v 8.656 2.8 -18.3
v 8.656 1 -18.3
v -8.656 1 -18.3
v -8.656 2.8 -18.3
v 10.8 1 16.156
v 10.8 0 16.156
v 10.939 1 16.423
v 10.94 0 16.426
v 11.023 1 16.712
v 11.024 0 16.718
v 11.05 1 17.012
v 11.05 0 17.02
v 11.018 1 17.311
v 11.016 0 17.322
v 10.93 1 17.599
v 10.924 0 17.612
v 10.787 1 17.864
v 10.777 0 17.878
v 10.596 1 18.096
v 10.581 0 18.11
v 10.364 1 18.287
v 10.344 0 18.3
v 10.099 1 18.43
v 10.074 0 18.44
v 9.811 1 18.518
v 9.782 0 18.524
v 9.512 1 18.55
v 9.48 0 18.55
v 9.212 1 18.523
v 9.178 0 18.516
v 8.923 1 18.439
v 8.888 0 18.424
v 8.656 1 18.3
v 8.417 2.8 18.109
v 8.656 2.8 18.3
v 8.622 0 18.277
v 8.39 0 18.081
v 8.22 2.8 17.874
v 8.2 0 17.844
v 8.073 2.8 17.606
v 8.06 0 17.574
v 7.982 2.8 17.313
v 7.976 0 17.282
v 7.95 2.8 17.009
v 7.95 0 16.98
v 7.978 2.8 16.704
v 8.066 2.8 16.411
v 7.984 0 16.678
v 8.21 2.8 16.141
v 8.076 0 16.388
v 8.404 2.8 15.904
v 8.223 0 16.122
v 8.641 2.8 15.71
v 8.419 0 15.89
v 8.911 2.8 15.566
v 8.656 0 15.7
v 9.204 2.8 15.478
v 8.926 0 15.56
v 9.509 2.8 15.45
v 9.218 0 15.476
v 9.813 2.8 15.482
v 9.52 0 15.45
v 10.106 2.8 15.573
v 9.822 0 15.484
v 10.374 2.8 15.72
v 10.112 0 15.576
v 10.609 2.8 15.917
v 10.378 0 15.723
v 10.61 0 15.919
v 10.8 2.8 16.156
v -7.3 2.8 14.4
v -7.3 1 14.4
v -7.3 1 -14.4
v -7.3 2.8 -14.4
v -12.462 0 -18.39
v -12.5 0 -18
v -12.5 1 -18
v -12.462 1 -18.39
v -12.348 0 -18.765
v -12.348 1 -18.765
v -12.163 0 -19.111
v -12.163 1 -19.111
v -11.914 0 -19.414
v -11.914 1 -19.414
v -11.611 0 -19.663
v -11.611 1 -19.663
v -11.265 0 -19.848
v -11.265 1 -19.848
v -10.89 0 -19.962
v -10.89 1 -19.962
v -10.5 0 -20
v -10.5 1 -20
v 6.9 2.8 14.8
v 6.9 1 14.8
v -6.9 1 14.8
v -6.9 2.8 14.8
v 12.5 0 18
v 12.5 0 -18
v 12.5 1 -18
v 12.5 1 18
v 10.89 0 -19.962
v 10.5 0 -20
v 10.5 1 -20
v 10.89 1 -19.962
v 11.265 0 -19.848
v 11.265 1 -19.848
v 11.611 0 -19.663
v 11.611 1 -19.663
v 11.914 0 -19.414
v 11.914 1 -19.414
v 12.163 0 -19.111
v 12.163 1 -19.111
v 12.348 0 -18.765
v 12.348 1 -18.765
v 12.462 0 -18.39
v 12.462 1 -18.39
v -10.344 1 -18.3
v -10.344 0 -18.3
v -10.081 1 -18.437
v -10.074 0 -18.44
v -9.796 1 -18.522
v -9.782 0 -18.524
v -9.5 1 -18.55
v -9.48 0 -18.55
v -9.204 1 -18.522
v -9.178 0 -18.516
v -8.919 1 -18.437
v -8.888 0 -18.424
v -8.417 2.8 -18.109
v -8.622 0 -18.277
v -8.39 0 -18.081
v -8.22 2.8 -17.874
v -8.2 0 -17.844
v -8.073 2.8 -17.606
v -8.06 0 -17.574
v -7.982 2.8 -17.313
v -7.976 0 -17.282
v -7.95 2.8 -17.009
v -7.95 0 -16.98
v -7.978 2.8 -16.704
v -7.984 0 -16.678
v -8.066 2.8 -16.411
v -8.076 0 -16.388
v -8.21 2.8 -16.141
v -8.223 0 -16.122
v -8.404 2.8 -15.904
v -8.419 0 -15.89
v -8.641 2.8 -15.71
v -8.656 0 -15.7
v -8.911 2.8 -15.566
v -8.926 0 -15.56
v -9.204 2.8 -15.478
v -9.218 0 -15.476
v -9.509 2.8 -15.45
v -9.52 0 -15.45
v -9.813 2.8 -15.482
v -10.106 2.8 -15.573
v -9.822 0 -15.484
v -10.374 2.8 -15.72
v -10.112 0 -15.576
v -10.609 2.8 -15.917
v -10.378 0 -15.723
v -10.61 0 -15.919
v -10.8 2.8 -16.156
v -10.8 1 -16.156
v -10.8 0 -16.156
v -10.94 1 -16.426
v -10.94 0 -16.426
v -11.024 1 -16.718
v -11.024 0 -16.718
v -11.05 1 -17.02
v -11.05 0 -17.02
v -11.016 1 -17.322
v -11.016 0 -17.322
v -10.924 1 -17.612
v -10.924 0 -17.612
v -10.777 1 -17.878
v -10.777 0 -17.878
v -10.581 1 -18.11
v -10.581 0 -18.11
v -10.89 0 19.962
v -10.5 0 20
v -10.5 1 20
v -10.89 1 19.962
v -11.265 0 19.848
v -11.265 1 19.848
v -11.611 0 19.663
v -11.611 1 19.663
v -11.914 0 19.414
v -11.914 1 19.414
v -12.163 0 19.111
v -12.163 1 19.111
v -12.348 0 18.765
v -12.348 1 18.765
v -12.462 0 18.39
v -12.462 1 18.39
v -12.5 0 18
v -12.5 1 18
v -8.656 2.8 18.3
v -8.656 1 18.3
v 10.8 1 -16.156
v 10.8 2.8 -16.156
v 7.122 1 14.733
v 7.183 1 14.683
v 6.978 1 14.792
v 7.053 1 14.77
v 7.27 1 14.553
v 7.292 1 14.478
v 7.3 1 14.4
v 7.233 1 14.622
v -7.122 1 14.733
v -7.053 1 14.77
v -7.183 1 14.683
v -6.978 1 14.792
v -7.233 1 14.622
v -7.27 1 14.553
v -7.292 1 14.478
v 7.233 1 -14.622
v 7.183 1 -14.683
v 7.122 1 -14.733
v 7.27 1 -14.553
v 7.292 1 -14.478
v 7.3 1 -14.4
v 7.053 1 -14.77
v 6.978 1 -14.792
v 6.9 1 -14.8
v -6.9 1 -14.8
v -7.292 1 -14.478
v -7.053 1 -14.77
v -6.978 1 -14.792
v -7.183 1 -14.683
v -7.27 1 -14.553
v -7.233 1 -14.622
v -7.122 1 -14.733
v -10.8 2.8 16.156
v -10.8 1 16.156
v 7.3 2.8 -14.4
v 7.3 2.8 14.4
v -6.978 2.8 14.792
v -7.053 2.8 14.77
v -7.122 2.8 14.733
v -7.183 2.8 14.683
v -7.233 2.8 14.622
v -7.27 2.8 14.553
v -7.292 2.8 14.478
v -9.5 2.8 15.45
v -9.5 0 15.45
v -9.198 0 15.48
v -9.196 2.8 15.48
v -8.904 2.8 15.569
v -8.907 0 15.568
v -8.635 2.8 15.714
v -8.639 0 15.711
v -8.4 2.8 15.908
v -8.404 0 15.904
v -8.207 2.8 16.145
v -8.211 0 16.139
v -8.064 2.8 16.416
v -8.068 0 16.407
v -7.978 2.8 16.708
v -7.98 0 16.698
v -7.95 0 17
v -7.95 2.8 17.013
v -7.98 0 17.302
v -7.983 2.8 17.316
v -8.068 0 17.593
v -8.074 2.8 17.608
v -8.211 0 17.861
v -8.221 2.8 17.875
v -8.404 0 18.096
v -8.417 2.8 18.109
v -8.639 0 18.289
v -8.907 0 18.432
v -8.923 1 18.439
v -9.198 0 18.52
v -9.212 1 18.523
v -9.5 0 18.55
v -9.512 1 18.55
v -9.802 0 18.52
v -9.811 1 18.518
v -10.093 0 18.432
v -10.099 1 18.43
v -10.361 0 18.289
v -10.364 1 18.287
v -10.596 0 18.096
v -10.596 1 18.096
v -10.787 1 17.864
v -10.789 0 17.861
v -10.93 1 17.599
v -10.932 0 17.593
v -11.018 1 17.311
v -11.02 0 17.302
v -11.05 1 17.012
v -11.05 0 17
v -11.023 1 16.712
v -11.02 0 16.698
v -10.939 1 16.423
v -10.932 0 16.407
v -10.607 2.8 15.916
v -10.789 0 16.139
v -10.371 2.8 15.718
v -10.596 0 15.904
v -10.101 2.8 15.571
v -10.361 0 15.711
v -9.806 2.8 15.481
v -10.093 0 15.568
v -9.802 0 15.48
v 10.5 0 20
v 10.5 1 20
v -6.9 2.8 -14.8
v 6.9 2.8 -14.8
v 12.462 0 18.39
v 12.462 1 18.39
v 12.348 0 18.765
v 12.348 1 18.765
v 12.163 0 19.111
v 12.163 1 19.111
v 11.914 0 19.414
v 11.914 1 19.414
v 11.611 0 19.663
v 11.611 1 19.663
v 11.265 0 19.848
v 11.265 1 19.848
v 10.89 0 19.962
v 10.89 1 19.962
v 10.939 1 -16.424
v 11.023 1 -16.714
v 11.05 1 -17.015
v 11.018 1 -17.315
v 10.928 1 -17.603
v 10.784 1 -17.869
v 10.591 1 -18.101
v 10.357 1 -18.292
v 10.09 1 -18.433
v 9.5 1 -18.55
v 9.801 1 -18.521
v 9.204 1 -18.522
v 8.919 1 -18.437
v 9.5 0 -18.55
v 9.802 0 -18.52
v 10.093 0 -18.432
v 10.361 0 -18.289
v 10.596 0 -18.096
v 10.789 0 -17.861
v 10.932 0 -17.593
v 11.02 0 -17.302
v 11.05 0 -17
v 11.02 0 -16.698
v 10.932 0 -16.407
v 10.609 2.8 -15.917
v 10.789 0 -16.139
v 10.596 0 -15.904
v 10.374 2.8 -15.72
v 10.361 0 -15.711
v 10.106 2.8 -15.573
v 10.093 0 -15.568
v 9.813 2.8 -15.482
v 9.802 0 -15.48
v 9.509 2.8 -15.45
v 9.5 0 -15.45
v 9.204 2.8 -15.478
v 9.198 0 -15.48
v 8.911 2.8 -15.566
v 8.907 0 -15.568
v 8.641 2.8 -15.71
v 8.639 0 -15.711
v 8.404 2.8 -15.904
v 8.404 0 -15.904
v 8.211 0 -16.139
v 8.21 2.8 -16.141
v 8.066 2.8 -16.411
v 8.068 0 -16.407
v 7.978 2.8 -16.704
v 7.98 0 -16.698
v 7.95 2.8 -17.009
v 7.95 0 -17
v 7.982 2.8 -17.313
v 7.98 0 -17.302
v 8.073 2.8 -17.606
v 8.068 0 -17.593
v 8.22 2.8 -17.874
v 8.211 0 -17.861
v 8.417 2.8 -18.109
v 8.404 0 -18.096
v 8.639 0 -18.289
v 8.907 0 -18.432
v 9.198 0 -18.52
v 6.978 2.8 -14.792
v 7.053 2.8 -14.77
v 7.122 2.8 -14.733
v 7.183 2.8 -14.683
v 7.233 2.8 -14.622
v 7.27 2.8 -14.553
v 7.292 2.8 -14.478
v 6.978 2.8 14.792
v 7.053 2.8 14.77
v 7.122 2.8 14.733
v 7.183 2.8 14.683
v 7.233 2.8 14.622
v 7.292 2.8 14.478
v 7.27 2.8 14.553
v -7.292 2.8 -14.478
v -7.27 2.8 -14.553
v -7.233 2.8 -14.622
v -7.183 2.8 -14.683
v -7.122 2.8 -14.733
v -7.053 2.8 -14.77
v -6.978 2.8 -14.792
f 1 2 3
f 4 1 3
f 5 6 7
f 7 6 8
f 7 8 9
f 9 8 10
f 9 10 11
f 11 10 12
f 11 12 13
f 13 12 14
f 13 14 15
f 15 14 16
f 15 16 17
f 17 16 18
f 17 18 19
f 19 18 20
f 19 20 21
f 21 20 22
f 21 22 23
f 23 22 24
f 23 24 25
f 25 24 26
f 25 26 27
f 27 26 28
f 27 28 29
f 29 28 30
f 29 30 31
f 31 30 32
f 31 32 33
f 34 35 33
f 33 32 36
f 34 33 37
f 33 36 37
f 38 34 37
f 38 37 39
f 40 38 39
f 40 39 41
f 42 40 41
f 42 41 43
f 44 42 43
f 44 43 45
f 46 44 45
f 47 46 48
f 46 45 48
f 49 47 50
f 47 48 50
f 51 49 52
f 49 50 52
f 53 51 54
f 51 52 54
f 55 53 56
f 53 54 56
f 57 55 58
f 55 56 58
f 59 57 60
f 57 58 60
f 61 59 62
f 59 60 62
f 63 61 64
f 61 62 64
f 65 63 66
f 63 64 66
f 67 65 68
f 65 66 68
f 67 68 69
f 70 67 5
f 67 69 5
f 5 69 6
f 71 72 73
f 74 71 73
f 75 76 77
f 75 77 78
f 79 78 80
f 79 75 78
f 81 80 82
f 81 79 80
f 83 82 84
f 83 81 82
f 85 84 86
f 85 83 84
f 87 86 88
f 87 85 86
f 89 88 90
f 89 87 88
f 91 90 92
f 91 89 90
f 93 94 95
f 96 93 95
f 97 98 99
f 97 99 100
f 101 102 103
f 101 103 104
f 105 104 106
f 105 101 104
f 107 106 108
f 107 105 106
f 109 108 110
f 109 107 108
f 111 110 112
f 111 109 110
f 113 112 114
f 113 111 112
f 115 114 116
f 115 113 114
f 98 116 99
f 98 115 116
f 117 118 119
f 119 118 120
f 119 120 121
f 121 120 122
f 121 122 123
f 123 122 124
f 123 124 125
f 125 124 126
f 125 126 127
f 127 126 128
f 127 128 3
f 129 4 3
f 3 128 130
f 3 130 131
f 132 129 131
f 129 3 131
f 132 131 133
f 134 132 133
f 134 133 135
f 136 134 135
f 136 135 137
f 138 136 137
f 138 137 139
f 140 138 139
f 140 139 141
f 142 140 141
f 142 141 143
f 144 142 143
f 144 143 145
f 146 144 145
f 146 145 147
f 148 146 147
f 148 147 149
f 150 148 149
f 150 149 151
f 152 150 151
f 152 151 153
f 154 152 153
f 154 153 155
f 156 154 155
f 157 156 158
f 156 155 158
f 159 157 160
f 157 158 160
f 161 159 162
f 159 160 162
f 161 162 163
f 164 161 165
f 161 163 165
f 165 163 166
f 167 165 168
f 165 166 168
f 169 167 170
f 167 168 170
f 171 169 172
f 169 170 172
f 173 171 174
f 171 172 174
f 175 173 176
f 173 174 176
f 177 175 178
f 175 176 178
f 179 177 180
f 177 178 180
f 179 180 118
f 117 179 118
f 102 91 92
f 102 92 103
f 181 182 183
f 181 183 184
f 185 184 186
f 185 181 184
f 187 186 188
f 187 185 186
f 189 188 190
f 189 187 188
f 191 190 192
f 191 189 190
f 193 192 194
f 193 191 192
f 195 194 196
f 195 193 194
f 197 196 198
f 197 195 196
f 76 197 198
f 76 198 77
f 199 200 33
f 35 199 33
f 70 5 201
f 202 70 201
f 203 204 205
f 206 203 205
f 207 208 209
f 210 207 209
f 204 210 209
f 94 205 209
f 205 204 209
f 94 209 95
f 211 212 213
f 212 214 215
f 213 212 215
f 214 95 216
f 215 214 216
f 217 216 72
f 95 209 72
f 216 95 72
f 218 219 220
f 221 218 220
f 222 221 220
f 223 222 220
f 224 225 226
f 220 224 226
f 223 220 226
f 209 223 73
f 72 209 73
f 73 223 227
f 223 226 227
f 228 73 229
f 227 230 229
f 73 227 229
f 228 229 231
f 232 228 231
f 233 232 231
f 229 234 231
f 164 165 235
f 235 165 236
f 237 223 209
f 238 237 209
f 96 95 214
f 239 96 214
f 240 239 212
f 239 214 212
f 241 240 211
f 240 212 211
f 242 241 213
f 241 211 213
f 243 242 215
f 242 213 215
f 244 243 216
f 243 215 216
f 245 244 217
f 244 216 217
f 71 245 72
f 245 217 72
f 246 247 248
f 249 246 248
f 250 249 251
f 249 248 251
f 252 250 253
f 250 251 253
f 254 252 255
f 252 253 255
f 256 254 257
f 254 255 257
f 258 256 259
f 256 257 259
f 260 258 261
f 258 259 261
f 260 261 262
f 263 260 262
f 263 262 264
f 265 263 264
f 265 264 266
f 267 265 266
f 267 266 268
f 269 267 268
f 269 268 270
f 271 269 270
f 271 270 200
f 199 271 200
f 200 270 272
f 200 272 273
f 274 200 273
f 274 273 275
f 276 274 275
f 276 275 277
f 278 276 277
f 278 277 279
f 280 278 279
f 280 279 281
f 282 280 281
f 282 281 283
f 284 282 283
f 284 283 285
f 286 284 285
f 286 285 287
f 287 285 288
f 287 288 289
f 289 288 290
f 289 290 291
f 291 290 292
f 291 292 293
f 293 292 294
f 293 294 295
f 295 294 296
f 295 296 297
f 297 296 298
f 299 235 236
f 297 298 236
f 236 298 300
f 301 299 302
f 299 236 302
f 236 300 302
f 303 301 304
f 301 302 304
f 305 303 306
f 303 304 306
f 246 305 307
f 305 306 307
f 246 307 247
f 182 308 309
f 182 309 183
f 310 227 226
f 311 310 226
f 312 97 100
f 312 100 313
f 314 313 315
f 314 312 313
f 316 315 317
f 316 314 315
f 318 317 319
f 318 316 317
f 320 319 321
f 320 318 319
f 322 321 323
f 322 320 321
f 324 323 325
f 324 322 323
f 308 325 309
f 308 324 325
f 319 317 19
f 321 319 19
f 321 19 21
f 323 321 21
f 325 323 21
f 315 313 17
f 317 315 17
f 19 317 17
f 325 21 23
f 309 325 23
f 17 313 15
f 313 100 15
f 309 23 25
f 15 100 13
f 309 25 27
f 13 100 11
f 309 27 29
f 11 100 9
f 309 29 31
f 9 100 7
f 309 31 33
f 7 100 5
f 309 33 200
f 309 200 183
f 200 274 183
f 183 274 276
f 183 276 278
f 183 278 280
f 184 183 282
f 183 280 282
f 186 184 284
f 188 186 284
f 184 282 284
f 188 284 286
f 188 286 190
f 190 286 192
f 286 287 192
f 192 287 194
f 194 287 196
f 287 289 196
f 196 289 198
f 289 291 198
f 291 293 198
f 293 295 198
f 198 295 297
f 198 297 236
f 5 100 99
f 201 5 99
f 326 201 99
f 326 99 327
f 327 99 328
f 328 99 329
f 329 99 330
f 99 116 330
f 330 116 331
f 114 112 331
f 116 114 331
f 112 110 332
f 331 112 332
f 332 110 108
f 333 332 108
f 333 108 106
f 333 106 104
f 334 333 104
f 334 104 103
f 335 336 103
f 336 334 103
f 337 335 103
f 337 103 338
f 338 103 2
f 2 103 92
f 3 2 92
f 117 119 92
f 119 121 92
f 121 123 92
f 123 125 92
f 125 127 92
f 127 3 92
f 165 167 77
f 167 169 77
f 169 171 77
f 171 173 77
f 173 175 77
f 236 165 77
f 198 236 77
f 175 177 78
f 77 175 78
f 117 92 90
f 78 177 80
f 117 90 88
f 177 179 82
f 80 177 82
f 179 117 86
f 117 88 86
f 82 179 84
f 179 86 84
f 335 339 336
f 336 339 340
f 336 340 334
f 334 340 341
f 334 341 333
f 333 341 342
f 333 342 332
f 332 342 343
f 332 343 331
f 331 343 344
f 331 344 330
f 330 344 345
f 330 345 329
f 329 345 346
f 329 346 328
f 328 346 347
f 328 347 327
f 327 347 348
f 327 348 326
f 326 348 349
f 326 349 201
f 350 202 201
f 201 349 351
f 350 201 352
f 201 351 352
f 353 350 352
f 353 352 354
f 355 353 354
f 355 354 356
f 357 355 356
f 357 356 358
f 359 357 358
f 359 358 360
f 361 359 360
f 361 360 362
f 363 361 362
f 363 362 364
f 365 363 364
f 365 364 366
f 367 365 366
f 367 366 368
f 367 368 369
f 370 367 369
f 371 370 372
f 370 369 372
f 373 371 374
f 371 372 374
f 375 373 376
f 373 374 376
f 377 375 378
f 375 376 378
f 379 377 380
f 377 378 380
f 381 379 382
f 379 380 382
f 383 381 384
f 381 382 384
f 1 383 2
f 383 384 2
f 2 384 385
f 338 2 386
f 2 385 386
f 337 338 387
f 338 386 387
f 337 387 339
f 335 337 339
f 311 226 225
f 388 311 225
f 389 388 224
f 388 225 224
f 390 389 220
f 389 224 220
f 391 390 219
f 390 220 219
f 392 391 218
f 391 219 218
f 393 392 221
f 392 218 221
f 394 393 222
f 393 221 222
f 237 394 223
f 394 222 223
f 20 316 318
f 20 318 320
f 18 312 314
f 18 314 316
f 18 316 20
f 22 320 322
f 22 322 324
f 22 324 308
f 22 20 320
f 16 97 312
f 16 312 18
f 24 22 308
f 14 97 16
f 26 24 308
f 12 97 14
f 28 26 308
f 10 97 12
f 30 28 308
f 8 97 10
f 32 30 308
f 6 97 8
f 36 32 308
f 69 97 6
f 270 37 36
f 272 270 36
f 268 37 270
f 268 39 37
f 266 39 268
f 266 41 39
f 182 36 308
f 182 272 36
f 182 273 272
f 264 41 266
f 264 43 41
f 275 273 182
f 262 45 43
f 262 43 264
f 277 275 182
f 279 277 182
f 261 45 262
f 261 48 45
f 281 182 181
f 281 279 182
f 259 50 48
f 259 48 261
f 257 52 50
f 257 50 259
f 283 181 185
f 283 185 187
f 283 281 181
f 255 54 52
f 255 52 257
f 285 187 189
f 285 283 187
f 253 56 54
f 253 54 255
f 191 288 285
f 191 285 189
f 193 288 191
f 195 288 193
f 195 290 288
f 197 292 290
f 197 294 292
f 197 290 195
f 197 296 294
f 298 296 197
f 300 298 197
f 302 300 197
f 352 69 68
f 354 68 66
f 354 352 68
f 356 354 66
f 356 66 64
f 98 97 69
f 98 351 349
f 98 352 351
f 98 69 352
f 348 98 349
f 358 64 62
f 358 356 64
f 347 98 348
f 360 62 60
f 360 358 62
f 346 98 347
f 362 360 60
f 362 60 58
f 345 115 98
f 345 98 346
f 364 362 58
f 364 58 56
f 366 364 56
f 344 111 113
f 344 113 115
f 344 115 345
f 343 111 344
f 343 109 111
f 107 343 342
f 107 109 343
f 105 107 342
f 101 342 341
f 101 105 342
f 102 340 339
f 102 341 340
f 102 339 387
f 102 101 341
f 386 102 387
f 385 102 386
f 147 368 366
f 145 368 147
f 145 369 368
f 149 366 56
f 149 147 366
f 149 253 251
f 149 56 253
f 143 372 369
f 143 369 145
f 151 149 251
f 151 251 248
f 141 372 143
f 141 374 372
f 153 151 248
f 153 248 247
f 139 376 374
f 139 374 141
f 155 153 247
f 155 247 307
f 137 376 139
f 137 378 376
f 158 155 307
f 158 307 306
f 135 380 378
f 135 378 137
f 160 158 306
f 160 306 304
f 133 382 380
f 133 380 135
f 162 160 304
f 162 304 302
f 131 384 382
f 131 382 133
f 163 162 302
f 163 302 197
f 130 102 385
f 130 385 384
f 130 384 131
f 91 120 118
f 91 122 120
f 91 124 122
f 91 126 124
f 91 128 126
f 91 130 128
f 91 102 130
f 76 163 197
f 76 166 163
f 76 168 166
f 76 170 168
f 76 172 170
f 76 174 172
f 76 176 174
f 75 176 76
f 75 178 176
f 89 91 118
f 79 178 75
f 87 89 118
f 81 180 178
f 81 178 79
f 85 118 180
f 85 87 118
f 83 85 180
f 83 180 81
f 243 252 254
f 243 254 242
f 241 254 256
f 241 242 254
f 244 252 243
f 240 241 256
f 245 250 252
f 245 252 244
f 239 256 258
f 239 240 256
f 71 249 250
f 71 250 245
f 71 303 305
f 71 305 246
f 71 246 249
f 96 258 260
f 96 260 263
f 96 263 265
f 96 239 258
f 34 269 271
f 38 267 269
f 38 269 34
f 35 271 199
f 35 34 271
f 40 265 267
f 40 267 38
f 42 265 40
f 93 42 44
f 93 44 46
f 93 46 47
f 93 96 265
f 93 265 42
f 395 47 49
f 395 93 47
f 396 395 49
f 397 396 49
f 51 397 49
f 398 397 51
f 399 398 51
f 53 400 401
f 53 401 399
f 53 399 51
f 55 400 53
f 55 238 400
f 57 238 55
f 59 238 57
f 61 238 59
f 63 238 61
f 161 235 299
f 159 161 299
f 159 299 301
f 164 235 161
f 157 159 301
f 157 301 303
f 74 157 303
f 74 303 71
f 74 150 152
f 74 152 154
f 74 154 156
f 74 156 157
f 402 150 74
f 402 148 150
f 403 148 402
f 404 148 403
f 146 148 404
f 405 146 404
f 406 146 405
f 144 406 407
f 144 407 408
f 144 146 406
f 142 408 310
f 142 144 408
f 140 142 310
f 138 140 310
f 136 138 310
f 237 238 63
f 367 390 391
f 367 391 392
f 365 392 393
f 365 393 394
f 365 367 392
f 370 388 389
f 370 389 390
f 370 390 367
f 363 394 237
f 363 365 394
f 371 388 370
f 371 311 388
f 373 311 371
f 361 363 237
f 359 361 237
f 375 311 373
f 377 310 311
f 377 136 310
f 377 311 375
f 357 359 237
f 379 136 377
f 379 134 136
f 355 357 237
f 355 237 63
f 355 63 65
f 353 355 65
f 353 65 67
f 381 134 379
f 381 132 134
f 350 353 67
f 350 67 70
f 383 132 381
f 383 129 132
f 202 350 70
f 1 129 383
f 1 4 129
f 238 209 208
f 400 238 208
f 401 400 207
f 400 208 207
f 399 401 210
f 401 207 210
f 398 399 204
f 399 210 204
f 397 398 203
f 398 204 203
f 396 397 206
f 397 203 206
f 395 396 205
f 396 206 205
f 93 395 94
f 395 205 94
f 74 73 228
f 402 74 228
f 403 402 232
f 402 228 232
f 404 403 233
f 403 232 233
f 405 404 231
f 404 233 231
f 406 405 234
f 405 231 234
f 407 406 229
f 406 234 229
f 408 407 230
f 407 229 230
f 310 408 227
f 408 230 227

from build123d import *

# Parameters (mm, degrees)
BASE_DEPTH        = 1
INT_RIEUR_DEPTH   = 1.8
PASSAGE_VIS_REACH = 25.751
ESQUISSE4_R       = 1.55
ESQUISSE5_W       = 27.6
ESQUISSE5_H       = 42.6
CLEANING_DEPTH    = 1.8


with BuildPart() as part:
    # Esquisse1 → Base (new body)
    with BuildSketch(Plane(origin=(0, 0, 0), x_dir=(1, 0, 0), z_dir=(0, 1, 0))):
        with BuildLine():
            Line((-10.5, 20), (10.5, 20))
            ThreePointArc((10.5, 20), (11.914213562, 19.414213562), (12.5, 18))
            Line((12.5, 18), (12.5, -18))
            ThreePointArc((12.5, -18), (11.914213562, -19.414213562), (10.5, -20))
            Line((10.5, -20), (-10.5, -20))
            ThreePointArc((-10.5, -20), (-11.914213562, -19.414213562), (-12.5, -18))
            Line((-12.5, -18), (-12.5, 18))
            ThreePointArc((-12.5, 18), (-11.914213562, 19.414213562), (-10.5, 20))
        make_face()
    extrude(amount=BASE_DEPTH)

    # Esquisse2 → Intérieur (add)
    with BuildSketch(Plane(origin=(0, 1, 0), x_dir=(1, 0, 0), z_dir=(0, 1, 0))):
        with BuildLine():
            Line((10.5, 18.3), (-10.5, 18.3))
            ThreePointArc((-10.5, 18.3), (-10.712132034, 18.212132034), (-10.8, 18))
            Line((-10.8, 18), (-10.8, -18))
            ThreePointArc((-10.8, -18), (-10.712132034, -18.212132034), (-10.5, -18.3))
            Line((-10.5, -18.3), (10.5, -18.3))
            ThreePointArc((10.5, -18.3), (10.712132034, -18.212132034), (10.8, -18))
            Line((10.8, -18), (10.8, 18))
            ThreePointArc((10.8, 18), (10.712132034, 18.212132034), (10.5, 18.3))
        make_face()
        with BuildLine():
            Line((-6.9, 14.8), (6.9, 14.8))
            ThreePointArc((6.9, 14.8), (7.182842712, 14.682842712), (7.3, 14.4))
            Line((7.3, 14.4), (7.3, -14.4))
            ThreePointArc((7.3, -14.4), (7.182842712, -14.682842712), (6.9, -14.8))
            Line((6.9, -14.8), (-6.9, -14.8))
            ThreePointArc((-6.9, -14.8), (-7.182842712, -14.682842712), (-7.3, -14.4))
            Line((-7.3, -14.4), (-7.3, 14.4))
            ThreePointArc((-7.3, 14.4), (-7.182842712, 14.682842712), (-6.9, 14.8))
        make_face(mode=Mode.SUBTRACT)
    extrude(amount=INT_RIEUR_DEPTH)

    # Esquisse4 → Passage_Vis (cut, up to next)
    with BuildSketch(Plane.XZ, mode=Mode.PRIVATE) as passage_vis_sk1:
        with Locations(Location((-9.5, 17, 0), (0, 0, 270))):
            Circle(ESQUISSE4_R)
    passage_vis_tool1 = extrude(passage_vis_sk1.sketch, amount=-PASSAGE_VIS_REACH, mode=Mode.PRIVATE) & part.part
    # Esquisse4 → Passage_Vis (cut, up to next)
    with BuildSketch(Plane.XZ, mode=Mode.PRIVATE) as passage_vis_sk2:
        with Locations(Location((9.5, 17, 0), (0, 0, 327.004114526))):
            Circle(ESQUISSE4_R)
    passage_vis_tool2 = extrude(passage_vis_sk2.sketch, amount=-PASSAGE_VIS_REACH, mode=Mode.PRIVATE) & part.part
    # Esquisse4 → Passage_Vis (cut, up to next)
    with BuildSketch(Plane.XZ, mode=Mode.PRIVATE) as passage_vis_sk3:
        with Locations(Location((9.5, -17, 0), (0, 0, 270))):
            Circle(ESQUISSE4_R)
    passage_vis_tool3 = extrude(passage_vis_sk3.sketch, amount=-PASSAGE_VIS_REACH, mode=Mode.PRIVATE) & part.part
    # Esquisse4 → Passage_Vis (cut, up to next)
    with BuildSketch(Plane.XZ, mode=Mode.PRIVATE) as passage_vis_sk4:
        with Locations(Location((-9.5, -17, 0), (0, 0, 237.004114526))):
            Circle(ESQUISSE4_R)
    passage_vis_tool4 = extrude(passage_vis_sk4.sketch, amount=-PASSAGE_VIS_REACH, mode=Mode.PRIVATE) & part.part
    add(passage_vis_tool1.solids().sort_by_distance((-9.5, 0, 17))[0], mode=Mode.SUBTRACT)
    add(passage_vis_tool2.solids().sort_by_distance((9.5, 0, 17))[0], mode=Mode.SUBTRACT)
    add(passage_vis_tool3.solids().sort_by_distance((9.5, 0, -17))[0], mode=Mode.SUBTRACT)
    add(passage_vis_tool4.solids().sort_by_distance((-9.5, 0, -17))[0], mode=Mode.SUBTRACT)

    # Esquisse5 → Cleaning (cut)
    with BuildSketch(Plane(origin=(0, 2.8, 0), x_dir=(1, 0, 0), z_dir=(0, 1, 0))):
        Rectangle(ESQUISSE5_W, ESQUISSE5_H)
        with BuildLine():
            Line((-9.2, 18.3), (9.2, 18.3))
            ThreePointArc((9.2, 18.3), (10.33137085, 17.83137085), (10.8, 16.7))
            Line((10.8, 16.7), (10.8, -16.7))
            ThreePointArc((10.8, -16.7), (10.33137085, -17.83137085), (9.2, -18.3))
            Line((9.2, -18.3), (-9.2, -18.3))
            ThreePointArc((-9.2, -18.3), (-10.33137085, -17.83137085), (-10.8, -16.7))
            Line((-10.8, -16.7), (-10.8, 16.7))
            ThreePointArc((-10.8, 16.7), (-10.33137085, 17.83137085), (-9.2, 18.3))
        make_face(mode=Mode.SUBTRACT)
    extrude(amount=-CLEANING_DEPTH, mode=Mode.SUBTRACT)


solid = part.part
